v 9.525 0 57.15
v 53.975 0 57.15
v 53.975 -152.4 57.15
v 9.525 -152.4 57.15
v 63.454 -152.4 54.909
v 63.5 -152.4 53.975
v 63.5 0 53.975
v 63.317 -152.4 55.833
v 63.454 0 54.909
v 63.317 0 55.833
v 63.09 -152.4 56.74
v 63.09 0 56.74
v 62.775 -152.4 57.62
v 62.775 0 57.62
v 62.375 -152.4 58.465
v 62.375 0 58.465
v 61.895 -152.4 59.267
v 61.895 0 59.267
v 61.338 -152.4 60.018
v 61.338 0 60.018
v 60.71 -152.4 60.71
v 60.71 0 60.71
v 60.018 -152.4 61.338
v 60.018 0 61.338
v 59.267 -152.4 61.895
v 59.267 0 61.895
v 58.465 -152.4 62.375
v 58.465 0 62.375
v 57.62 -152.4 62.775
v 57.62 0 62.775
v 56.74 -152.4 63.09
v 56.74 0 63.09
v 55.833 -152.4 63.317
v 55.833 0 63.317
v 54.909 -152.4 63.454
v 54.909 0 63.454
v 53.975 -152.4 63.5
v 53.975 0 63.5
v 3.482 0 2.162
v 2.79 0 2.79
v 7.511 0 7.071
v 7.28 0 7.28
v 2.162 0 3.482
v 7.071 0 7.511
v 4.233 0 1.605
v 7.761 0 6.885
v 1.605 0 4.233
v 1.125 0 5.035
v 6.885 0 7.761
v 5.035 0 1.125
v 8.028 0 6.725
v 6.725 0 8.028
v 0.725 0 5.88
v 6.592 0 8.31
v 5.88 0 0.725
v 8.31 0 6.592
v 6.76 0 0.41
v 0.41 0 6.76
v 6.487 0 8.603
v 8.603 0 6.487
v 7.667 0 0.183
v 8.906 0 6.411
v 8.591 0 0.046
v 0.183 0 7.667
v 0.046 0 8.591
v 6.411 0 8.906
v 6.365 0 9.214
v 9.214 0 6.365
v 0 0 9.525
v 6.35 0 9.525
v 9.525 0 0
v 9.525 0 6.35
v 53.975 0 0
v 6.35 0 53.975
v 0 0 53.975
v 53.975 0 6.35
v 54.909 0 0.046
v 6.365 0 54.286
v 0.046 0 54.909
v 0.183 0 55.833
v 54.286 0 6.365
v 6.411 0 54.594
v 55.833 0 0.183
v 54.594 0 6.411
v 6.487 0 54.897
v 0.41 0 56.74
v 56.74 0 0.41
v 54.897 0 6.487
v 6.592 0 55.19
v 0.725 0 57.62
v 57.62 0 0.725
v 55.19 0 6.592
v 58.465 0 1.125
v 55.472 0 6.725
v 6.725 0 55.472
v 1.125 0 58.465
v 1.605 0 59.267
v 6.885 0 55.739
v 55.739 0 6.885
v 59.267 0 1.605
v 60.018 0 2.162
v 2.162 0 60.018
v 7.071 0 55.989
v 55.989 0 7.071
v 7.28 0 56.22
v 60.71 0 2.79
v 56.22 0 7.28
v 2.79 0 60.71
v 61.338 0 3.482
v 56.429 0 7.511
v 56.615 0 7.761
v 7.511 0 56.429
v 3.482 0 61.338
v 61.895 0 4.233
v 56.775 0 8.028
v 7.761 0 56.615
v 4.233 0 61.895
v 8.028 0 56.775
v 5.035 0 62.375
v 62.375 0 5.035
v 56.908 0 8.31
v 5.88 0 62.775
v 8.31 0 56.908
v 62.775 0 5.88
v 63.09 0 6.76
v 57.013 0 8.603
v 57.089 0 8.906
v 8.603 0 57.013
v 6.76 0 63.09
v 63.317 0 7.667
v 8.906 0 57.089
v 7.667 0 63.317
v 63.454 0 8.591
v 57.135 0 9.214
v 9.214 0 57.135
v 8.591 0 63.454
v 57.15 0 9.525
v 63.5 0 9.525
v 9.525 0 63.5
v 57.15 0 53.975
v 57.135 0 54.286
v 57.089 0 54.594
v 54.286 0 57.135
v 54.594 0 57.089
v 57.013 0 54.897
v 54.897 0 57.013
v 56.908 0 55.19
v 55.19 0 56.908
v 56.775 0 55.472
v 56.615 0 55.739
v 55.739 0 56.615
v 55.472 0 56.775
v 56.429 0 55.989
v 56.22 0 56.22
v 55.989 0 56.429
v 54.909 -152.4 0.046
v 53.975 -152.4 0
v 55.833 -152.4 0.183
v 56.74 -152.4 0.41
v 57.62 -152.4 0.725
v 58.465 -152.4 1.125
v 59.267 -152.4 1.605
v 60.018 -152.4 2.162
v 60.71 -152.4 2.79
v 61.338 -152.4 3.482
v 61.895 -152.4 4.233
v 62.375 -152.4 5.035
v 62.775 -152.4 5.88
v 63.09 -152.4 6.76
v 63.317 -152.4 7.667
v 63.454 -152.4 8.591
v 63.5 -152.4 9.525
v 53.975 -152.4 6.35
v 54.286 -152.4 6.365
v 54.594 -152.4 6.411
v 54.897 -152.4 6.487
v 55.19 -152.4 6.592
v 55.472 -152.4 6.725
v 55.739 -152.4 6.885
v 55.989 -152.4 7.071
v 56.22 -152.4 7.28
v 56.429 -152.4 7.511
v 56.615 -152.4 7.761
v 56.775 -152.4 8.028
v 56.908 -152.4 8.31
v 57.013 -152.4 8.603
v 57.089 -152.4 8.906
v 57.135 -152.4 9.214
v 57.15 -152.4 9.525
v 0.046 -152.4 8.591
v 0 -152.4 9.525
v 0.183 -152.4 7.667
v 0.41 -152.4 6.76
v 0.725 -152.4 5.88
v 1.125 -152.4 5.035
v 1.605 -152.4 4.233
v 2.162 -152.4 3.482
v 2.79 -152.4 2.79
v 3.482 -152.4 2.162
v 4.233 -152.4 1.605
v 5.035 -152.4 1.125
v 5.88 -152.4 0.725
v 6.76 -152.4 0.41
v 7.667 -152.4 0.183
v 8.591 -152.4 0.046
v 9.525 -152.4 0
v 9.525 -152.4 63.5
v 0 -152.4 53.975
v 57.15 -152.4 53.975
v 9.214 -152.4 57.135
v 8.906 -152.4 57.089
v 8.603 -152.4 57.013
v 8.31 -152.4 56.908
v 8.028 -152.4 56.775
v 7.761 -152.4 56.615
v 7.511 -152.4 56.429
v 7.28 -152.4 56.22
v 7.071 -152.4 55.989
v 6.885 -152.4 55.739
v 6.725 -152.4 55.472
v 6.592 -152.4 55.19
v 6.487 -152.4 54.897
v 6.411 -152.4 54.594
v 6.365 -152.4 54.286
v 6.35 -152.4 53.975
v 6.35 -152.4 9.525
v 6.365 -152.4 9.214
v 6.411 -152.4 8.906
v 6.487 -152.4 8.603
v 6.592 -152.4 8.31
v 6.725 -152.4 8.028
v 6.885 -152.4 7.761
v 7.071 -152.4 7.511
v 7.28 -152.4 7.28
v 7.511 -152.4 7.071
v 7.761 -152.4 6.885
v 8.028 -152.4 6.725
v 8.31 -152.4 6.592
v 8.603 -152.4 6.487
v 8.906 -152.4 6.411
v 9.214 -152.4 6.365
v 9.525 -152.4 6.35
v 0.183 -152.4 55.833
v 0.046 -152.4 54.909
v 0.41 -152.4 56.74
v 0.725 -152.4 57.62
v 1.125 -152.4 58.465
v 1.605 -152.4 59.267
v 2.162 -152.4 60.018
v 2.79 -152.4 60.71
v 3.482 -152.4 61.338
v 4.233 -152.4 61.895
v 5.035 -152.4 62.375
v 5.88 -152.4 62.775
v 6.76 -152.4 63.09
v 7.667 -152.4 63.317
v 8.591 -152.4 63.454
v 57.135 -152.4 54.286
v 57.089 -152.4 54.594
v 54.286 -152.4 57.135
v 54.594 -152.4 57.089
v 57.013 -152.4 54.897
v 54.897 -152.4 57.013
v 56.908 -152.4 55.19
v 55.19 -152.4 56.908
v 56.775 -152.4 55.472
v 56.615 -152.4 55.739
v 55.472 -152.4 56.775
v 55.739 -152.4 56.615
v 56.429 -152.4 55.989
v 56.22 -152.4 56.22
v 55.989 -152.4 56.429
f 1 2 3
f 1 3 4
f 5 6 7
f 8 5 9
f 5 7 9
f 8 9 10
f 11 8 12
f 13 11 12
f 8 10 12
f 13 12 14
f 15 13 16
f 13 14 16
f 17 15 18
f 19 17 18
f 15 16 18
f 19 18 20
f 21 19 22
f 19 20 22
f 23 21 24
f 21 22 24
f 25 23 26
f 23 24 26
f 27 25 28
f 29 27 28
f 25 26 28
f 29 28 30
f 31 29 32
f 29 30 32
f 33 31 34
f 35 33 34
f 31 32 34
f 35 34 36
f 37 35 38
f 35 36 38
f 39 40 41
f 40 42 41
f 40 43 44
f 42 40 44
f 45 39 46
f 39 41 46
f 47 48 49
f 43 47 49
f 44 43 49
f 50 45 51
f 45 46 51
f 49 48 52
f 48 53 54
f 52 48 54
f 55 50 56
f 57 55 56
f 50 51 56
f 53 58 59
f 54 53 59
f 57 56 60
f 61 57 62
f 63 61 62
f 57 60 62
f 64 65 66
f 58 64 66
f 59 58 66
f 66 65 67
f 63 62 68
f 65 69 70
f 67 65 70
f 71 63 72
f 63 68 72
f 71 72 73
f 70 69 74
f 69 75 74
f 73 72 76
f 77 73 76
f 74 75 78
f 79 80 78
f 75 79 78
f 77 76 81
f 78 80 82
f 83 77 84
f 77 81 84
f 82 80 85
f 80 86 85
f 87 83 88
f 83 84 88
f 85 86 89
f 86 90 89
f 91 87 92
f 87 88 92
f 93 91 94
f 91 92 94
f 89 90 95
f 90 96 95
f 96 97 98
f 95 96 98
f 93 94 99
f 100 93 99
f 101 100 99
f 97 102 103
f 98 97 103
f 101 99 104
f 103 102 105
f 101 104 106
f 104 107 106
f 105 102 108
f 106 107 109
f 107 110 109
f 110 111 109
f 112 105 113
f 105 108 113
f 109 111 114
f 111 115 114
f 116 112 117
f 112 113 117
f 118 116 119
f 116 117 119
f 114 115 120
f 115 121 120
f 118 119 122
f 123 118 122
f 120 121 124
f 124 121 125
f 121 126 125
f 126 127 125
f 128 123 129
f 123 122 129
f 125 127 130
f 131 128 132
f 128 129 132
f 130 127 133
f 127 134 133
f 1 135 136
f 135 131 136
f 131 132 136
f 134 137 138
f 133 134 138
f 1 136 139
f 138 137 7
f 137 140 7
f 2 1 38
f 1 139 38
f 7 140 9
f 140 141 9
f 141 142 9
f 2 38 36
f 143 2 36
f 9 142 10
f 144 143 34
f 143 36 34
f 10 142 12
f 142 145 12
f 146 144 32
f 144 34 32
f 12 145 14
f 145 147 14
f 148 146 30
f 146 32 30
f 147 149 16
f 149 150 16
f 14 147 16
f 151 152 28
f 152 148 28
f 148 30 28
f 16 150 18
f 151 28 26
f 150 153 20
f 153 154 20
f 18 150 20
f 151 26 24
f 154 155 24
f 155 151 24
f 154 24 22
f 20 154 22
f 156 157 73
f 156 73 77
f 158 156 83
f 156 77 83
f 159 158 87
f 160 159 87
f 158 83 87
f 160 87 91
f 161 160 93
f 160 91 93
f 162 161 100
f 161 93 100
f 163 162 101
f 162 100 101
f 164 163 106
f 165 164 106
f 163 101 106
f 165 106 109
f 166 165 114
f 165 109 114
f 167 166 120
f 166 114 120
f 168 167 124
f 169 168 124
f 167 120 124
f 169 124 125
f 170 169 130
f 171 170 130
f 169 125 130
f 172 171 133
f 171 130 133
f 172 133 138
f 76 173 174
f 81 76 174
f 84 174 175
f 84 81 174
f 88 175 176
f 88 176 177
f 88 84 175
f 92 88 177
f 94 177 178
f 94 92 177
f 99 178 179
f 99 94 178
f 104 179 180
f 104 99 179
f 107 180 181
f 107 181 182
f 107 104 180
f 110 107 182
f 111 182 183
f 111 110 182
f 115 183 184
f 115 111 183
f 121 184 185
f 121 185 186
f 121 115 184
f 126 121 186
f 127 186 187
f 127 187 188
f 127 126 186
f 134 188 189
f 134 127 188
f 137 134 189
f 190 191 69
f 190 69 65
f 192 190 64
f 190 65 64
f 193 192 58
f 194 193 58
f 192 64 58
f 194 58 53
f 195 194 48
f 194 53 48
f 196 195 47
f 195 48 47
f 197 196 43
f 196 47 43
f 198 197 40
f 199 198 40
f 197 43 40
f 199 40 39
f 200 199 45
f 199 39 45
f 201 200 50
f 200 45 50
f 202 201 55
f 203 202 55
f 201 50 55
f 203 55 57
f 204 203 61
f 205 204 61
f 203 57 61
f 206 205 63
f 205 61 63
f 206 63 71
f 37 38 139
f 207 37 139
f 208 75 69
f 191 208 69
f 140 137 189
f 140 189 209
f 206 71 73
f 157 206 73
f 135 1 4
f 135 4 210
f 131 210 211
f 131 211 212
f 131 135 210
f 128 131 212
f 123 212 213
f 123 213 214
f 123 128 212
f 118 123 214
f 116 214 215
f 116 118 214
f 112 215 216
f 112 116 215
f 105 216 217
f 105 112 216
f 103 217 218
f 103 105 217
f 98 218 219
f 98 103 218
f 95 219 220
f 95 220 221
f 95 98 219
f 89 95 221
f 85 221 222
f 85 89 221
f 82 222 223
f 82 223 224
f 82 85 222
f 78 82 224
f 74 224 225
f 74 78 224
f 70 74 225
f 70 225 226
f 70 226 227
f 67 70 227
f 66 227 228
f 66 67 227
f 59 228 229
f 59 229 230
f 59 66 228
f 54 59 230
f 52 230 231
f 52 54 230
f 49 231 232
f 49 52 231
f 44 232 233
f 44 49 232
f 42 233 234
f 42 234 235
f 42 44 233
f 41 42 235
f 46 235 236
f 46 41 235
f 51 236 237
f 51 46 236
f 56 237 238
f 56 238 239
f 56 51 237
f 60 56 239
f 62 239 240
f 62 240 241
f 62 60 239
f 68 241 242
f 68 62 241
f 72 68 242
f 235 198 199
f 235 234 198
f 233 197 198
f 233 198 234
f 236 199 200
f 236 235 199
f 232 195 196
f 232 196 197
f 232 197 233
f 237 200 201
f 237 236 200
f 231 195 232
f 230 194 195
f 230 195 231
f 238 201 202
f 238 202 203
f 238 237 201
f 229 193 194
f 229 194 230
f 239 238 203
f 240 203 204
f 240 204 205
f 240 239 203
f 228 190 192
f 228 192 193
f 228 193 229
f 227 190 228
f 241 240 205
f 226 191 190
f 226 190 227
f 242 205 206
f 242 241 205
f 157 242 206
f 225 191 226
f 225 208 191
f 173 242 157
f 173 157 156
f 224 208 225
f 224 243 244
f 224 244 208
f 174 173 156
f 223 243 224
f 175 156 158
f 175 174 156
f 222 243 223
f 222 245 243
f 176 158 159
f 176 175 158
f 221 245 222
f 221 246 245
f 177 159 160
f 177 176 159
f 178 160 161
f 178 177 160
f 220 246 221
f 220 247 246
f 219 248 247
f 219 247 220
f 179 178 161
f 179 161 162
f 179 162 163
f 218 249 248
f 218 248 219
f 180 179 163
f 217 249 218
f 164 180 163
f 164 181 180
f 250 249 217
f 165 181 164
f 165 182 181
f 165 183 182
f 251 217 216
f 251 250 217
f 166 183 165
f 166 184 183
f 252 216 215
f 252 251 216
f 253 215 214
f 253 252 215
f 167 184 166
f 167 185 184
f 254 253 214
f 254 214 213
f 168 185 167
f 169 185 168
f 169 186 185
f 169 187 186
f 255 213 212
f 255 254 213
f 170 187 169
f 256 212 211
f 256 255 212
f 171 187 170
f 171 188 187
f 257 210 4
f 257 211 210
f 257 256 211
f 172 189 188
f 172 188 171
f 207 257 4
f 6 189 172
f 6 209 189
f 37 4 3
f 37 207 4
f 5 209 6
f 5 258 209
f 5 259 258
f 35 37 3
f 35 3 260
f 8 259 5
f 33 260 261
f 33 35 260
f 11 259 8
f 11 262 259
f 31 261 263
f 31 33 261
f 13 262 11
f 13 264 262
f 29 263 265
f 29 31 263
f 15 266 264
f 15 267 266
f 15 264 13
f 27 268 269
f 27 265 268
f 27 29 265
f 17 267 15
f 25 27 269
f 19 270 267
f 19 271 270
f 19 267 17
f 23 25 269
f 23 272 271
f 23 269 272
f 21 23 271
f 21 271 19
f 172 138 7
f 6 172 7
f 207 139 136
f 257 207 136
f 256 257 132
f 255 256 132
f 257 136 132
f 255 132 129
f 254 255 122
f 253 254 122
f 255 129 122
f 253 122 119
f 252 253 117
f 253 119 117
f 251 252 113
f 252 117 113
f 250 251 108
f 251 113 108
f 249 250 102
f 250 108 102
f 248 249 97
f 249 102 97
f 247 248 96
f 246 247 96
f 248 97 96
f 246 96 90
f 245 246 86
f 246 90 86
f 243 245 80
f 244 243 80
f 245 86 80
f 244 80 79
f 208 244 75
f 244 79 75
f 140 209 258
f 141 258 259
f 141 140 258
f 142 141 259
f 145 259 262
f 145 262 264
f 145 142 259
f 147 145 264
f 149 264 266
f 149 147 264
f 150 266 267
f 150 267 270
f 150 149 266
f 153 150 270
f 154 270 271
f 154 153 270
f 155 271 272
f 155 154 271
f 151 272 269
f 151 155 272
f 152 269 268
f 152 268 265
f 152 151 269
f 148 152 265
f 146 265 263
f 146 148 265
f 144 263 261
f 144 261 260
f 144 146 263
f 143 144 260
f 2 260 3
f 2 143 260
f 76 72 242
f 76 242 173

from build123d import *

# Parameters (mm, degrees)
F1_DEPTH = 152.4
F2_T     = -6.35


with BuildPart() as f1:
    # F0 (on Front) → F1 (new body)
    with BuildSketch(Plane.XZ):
        with BuildLine():
            ThreePointArc((0, 9.525), (2.789808, 2.789808), (9.525, 0))
            Line((9.525, 0), (53.975, 0))
            ThreePointArc((53.975, 0), (60.710192, 2.789808), (63.5, 9.525))
            Line((63.5, 9.525), (63.5, 53.975))
            ThreePointArc((63.5, 53.975), (60.710192, 60.710192), (53.975, 63.5))
            Line((53.975, 63.5), (9.525, 63.5))
            ThreePointArc((9.525, 63.5), (2.789808, 60.710192), (0, 53.975))
            Line((0, 53.975), (0, 9.525))
        make_face()
    extrude(amount=F1_DEPTH)

    # F2
    f2_openings = [f1.faces().sort_by_distance(p)[0] for p in [
        (31.75, -152.4, 31.75),
        (31.75, 0, 31.75),
    ]]
    offset(amount=F2_T, openings=f2_openings)


solid = f1.part
